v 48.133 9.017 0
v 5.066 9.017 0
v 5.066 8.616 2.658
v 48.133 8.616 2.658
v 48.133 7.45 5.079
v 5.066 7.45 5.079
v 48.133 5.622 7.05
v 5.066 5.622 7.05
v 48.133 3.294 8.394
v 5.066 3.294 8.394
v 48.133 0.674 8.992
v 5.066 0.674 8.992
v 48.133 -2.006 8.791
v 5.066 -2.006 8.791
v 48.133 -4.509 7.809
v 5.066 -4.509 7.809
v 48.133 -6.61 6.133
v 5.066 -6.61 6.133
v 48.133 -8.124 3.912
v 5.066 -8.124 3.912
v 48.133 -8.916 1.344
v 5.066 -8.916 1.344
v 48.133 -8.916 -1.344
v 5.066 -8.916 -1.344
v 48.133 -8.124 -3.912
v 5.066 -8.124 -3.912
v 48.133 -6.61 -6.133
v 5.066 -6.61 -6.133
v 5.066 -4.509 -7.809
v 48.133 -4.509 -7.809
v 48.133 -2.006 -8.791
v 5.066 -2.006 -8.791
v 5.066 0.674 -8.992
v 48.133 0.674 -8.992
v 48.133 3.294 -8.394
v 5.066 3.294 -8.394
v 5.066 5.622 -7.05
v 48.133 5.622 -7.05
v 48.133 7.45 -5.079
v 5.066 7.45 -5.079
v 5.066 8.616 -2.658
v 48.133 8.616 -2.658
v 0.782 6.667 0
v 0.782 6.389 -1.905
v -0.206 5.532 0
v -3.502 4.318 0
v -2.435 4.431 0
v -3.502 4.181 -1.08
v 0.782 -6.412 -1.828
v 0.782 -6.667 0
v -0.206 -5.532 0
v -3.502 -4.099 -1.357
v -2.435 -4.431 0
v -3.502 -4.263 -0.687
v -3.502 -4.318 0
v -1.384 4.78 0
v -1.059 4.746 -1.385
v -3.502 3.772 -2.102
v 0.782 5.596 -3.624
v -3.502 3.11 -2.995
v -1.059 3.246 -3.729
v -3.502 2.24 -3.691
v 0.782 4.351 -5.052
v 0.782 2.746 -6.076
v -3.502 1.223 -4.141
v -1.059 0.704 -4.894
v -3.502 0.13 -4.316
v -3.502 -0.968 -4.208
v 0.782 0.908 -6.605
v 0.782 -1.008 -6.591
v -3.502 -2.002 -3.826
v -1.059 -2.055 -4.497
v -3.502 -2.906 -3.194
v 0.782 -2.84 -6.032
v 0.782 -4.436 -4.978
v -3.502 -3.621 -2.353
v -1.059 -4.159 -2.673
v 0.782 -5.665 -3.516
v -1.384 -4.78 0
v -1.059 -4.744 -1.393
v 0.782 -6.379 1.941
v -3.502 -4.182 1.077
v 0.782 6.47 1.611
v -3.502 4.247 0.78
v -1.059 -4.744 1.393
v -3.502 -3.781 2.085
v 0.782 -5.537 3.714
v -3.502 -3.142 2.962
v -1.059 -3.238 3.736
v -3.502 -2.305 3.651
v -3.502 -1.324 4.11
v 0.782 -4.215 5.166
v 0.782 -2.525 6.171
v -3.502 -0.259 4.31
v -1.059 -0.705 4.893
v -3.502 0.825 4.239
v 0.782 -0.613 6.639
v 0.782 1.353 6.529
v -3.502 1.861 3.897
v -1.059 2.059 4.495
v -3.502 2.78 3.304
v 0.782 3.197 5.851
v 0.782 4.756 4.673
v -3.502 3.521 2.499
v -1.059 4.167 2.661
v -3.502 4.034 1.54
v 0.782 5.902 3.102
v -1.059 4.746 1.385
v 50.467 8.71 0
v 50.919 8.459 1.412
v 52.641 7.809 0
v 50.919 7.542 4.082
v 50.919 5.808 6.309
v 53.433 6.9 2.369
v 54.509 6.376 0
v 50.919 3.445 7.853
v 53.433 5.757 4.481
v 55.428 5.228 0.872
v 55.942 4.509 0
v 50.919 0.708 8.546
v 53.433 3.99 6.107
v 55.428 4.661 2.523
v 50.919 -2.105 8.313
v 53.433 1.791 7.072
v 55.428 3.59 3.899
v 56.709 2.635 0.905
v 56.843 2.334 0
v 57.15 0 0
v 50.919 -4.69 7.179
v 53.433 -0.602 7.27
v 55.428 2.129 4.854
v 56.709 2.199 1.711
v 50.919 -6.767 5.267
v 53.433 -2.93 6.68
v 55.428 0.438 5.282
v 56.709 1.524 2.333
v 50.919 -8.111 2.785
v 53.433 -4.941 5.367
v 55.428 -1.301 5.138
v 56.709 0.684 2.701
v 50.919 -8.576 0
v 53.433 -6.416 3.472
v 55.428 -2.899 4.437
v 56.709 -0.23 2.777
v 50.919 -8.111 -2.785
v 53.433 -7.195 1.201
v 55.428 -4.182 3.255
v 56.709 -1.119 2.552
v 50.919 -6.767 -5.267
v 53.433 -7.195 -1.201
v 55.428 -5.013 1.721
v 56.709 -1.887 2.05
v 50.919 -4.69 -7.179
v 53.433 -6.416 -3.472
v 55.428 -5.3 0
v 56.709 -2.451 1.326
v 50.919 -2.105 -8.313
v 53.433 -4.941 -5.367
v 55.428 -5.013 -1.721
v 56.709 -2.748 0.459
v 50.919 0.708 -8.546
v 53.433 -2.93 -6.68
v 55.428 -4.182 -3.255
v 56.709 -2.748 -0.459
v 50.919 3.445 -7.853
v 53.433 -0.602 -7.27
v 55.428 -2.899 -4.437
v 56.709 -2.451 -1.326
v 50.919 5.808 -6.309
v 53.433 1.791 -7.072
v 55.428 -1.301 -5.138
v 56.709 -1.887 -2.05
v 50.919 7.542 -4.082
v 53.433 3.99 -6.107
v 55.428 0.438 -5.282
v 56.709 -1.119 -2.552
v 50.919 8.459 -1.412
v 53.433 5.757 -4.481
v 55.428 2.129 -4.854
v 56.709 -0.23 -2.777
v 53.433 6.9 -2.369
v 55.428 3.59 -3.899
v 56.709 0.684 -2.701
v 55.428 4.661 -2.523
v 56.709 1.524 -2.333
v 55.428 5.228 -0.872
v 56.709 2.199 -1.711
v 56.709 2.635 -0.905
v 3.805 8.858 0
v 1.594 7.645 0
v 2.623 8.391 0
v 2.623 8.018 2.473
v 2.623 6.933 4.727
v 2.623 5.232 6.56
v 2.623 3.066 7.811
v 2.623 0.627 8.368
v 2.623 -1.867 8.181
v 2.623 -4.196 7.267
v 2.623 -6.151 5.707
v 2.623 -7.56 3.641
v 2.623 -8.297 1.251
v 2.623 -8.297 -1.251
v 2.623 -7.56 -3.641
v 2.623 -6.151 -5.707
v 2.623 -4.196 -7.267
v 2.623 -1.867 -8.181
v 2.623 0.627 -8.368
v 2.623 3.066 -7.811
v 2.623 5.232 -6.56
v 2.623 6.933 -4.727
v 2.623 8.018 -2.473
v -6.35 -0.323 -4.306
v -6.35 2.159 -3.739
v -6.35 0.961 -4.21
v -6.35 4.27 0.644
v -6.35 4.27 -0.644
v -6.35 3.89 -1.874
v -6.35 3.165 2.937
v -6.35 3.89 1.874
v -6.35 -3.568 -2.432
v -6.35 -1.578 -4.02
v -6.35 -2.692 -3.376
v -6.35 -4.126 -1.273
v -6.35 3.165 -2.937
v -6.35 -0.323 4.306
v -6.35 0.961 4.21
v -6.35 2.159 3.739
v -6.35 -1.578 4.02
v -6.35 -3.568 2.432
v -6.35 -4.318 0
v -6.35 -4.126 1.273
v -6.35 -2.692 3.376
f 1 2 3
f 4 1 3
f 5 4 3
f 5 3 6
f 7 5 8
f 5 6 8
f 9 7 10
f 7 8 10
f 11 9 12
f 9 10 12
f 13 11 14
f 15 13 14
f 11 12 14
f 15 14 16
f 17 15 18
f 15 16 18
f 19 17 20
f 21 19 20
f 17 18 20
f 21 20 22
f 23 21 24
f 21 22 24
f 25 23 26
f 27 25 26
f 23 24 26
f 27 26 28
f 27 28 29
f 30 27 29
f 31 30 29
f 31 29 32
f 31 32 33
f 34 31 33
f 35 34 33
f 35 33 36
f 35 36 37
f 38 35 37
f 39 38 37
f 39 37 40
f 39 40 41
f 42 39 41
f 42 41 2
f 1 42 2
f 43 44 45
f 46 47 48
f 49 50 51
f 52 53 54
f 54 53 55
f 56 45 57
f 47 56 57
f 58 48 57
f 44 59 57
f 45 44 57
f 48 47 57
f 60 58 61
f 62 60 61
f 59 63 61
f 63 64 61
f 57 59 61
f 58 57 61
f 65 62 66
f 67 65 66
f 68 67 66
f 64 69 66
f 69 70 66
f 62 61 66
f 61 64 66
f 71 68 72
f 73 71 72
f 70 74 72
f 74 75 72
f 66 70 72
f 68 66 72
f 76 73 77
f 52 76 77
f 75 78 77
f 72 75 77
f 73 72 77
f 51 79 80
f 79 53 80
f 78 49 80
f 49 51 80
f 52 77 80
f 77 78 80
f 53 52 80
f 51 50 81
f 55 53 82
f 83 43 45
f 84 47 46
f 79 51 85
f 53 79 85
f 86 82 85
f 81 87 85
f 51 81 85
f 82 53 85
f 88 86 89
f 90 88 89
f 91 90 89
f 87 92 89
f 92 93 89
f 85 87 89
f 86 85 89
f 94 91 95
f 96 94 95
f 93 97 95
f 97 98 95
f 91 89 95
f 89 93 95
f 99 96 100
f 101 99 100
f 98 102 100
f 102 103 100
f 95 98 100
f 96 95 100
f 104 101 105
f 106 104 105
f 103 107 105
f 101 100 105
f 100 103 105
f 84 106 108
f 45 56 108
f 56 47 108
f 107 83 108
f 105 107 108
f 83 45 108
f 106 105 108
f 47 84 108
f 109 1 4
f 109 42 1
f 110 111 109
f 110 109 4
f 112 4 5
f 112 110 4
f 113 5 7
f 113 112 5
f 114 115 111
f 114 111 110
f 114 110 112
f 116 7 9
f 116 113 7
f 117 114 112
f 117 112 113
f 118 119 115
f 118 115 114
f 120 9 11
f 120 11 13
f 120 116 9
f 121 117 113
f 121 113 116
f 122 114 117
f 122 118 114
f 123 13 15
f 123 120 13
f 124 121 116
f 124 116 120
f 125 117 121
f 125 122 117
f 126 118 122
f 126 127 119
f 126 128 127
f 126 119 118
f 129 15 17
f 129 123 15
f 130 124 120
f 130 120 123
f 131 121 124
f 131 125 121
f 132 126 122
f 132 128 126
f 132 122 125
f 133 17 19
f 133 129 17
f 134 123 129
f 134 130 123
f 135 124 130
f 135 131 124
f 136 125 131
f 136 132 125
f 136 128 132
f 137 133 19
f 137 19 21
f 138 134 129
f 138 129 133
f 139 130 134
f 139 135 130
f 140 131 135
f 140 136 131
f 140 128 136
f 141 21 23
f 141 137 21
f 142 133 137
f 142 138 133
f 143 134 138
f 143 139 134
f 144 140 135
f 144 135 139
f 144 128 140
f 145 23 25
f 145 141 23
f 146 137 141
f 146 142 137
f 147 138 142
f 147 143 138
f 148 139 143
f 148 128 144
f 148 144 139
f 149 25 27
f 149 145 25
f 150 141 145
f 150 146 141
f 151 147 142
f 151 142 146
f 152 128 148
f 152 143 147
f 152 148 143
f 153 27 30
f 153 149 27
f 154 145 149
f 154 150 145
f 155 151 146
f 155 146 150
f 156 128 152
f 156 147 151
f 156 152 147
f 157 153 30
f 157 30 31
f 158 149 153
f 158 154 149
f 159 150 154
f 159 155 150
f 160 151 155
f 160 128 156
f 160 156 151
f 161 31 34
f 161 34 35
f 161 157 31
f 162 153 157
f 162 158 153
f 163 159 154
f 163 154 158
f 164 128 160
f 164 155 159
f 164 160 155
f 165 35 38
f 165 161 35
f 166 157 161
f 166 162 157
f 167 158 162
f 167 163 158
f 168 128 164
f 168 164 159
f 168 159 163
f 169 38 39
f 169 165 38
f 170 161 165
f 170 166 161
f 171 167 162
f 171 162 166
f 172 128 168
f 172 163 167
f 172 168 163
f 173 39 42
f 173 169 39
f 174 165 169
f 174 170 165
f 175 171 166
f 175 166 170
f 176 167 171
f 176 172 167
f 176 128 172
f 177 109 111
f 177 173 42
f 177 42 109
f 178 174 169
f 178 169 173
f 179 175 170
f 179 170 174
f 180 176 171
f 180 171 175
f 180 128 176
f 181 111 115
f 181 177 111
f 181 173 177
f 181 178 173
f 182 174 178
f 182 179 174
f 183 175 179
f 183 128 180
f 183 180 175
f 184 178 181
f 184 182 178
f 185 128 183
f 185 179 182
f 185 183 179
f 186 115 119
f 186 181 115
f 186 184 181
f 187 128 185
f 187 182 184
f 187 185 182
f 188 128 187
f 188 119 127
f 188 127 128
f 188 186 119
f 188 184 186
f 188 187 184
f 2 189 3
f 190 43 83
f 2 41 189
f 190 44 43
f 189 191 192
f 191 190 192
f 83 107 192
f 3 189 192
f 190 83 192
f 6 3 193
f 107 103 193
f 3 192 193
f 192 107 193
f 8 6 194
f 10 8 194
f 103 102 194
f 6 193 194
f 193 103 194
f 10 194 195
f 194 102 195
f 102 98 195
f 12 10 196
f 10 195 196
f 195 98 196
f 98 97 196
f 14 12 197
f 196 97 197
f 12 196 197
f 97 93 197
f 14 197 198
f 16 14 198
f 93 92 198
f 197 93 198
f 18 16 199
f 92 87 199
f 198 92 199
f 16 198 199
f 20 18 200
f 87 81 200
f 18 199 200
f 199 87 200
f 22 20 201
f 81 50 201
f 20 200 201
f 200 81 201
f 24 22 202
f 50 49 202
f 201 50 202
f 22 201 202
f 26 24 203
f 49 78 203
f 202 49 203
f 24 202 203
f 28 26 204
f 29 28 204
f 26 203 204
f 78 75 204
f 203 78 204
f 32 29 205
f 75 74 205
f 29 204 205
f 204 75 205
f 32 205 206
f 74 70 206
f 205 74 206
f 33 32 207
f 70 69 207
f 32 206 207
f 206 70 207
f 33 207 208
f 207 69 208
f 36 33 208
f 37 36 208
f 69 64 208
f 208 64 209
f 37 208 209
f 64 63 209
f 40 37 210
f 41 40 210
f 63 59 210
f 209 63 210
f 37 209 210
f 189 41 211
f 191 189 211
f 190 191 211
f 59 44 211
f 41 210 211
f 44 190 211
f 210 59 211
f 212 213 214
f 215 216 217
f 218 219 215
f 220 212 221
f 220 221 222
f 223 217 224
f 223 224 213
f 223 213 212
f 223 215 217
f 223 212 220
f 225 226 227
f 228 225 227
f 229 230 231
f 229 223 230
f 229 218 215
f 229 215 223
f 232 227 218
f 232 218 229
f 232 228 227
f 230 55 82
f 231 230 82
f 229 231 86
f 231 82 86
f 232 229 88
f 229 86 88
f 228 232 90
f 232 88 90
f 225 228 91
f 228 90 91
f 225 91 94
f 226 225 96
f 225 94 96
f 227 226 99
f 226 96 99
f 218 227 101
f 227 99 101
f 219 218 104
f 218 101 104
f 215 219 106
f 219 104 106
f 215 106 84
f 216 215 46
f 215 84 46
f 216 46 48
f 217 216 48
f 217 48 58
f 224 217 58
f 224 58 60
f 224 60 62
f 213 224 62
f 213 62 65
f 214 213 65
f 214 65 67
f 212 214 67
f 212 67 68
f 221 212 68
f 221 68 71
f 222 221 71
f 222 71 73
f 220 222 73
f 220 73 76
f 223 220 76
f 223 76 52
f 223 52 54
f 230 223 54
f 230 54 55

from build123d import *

# Parameters (mm, degrees)
F0_R     = 9.017
F1_DEPTH = 57.15
F2_R     = 4.318
F3_DEPTH = 6.35
F5_R     = 9.017
F7_R     = 5.08


# Not quite as in the source:
# - a fillet or chamfer that OpenCascade refuses, or shapes differently, is made with other operations: its cross-section is extruded or revolved along the edge and cut away or added


with BuildPart() as f1:
    # F0 (on Right) → F1 (new body)
    with BuildSketch(Plane.YZ):
        Circle(F0_R)
    extrude(amount=F1_DEPTH)

    # F2 (on face) → F3 (join)
    with BuildSketch(Plane(origin=(0, 0, 0), x_dir=(0, -1, 0), z_dir=(-1, 0, 0))):
        Circle(F2_R)
    extrude(amount=F3_DEPTH)

    # F5
    f5_edges = [f1.edges().sort_by_distance(p)[0] for p in [
        (57.15, -9.017, 0),
    ]]
    fillet(f5_edges, radius=F5_R)

    # F6: fillet of radius 5.08 on 3 edges, made by hand

    # F6_s1 → F6_t2 (revolve, cut)
    with BuildSketch(Plane.XY):
        with BuildLine():
            ThreePointArc((5.0656923515, 9.017), (1.6109188423, 7.6613710878), (0, 4.318))
            Line((0, 4.318), (0, 9.017))
            Line((0, 9.017), (5.0656923515, 9.017))
        make_face()
    revolve(axis=Axis((0, 0, 0), (1, 0, 0)), mode=Mode.SUBTRACT)

    # F7
    f7_edges = [f1.edges().sort_by_distance(p)[0] for p in [
        (0, 0, 4.318),
        (0, 0, -4.318),
    ]]
    fillet(f7_edges, radius=F7_R)


solid = f1.part
